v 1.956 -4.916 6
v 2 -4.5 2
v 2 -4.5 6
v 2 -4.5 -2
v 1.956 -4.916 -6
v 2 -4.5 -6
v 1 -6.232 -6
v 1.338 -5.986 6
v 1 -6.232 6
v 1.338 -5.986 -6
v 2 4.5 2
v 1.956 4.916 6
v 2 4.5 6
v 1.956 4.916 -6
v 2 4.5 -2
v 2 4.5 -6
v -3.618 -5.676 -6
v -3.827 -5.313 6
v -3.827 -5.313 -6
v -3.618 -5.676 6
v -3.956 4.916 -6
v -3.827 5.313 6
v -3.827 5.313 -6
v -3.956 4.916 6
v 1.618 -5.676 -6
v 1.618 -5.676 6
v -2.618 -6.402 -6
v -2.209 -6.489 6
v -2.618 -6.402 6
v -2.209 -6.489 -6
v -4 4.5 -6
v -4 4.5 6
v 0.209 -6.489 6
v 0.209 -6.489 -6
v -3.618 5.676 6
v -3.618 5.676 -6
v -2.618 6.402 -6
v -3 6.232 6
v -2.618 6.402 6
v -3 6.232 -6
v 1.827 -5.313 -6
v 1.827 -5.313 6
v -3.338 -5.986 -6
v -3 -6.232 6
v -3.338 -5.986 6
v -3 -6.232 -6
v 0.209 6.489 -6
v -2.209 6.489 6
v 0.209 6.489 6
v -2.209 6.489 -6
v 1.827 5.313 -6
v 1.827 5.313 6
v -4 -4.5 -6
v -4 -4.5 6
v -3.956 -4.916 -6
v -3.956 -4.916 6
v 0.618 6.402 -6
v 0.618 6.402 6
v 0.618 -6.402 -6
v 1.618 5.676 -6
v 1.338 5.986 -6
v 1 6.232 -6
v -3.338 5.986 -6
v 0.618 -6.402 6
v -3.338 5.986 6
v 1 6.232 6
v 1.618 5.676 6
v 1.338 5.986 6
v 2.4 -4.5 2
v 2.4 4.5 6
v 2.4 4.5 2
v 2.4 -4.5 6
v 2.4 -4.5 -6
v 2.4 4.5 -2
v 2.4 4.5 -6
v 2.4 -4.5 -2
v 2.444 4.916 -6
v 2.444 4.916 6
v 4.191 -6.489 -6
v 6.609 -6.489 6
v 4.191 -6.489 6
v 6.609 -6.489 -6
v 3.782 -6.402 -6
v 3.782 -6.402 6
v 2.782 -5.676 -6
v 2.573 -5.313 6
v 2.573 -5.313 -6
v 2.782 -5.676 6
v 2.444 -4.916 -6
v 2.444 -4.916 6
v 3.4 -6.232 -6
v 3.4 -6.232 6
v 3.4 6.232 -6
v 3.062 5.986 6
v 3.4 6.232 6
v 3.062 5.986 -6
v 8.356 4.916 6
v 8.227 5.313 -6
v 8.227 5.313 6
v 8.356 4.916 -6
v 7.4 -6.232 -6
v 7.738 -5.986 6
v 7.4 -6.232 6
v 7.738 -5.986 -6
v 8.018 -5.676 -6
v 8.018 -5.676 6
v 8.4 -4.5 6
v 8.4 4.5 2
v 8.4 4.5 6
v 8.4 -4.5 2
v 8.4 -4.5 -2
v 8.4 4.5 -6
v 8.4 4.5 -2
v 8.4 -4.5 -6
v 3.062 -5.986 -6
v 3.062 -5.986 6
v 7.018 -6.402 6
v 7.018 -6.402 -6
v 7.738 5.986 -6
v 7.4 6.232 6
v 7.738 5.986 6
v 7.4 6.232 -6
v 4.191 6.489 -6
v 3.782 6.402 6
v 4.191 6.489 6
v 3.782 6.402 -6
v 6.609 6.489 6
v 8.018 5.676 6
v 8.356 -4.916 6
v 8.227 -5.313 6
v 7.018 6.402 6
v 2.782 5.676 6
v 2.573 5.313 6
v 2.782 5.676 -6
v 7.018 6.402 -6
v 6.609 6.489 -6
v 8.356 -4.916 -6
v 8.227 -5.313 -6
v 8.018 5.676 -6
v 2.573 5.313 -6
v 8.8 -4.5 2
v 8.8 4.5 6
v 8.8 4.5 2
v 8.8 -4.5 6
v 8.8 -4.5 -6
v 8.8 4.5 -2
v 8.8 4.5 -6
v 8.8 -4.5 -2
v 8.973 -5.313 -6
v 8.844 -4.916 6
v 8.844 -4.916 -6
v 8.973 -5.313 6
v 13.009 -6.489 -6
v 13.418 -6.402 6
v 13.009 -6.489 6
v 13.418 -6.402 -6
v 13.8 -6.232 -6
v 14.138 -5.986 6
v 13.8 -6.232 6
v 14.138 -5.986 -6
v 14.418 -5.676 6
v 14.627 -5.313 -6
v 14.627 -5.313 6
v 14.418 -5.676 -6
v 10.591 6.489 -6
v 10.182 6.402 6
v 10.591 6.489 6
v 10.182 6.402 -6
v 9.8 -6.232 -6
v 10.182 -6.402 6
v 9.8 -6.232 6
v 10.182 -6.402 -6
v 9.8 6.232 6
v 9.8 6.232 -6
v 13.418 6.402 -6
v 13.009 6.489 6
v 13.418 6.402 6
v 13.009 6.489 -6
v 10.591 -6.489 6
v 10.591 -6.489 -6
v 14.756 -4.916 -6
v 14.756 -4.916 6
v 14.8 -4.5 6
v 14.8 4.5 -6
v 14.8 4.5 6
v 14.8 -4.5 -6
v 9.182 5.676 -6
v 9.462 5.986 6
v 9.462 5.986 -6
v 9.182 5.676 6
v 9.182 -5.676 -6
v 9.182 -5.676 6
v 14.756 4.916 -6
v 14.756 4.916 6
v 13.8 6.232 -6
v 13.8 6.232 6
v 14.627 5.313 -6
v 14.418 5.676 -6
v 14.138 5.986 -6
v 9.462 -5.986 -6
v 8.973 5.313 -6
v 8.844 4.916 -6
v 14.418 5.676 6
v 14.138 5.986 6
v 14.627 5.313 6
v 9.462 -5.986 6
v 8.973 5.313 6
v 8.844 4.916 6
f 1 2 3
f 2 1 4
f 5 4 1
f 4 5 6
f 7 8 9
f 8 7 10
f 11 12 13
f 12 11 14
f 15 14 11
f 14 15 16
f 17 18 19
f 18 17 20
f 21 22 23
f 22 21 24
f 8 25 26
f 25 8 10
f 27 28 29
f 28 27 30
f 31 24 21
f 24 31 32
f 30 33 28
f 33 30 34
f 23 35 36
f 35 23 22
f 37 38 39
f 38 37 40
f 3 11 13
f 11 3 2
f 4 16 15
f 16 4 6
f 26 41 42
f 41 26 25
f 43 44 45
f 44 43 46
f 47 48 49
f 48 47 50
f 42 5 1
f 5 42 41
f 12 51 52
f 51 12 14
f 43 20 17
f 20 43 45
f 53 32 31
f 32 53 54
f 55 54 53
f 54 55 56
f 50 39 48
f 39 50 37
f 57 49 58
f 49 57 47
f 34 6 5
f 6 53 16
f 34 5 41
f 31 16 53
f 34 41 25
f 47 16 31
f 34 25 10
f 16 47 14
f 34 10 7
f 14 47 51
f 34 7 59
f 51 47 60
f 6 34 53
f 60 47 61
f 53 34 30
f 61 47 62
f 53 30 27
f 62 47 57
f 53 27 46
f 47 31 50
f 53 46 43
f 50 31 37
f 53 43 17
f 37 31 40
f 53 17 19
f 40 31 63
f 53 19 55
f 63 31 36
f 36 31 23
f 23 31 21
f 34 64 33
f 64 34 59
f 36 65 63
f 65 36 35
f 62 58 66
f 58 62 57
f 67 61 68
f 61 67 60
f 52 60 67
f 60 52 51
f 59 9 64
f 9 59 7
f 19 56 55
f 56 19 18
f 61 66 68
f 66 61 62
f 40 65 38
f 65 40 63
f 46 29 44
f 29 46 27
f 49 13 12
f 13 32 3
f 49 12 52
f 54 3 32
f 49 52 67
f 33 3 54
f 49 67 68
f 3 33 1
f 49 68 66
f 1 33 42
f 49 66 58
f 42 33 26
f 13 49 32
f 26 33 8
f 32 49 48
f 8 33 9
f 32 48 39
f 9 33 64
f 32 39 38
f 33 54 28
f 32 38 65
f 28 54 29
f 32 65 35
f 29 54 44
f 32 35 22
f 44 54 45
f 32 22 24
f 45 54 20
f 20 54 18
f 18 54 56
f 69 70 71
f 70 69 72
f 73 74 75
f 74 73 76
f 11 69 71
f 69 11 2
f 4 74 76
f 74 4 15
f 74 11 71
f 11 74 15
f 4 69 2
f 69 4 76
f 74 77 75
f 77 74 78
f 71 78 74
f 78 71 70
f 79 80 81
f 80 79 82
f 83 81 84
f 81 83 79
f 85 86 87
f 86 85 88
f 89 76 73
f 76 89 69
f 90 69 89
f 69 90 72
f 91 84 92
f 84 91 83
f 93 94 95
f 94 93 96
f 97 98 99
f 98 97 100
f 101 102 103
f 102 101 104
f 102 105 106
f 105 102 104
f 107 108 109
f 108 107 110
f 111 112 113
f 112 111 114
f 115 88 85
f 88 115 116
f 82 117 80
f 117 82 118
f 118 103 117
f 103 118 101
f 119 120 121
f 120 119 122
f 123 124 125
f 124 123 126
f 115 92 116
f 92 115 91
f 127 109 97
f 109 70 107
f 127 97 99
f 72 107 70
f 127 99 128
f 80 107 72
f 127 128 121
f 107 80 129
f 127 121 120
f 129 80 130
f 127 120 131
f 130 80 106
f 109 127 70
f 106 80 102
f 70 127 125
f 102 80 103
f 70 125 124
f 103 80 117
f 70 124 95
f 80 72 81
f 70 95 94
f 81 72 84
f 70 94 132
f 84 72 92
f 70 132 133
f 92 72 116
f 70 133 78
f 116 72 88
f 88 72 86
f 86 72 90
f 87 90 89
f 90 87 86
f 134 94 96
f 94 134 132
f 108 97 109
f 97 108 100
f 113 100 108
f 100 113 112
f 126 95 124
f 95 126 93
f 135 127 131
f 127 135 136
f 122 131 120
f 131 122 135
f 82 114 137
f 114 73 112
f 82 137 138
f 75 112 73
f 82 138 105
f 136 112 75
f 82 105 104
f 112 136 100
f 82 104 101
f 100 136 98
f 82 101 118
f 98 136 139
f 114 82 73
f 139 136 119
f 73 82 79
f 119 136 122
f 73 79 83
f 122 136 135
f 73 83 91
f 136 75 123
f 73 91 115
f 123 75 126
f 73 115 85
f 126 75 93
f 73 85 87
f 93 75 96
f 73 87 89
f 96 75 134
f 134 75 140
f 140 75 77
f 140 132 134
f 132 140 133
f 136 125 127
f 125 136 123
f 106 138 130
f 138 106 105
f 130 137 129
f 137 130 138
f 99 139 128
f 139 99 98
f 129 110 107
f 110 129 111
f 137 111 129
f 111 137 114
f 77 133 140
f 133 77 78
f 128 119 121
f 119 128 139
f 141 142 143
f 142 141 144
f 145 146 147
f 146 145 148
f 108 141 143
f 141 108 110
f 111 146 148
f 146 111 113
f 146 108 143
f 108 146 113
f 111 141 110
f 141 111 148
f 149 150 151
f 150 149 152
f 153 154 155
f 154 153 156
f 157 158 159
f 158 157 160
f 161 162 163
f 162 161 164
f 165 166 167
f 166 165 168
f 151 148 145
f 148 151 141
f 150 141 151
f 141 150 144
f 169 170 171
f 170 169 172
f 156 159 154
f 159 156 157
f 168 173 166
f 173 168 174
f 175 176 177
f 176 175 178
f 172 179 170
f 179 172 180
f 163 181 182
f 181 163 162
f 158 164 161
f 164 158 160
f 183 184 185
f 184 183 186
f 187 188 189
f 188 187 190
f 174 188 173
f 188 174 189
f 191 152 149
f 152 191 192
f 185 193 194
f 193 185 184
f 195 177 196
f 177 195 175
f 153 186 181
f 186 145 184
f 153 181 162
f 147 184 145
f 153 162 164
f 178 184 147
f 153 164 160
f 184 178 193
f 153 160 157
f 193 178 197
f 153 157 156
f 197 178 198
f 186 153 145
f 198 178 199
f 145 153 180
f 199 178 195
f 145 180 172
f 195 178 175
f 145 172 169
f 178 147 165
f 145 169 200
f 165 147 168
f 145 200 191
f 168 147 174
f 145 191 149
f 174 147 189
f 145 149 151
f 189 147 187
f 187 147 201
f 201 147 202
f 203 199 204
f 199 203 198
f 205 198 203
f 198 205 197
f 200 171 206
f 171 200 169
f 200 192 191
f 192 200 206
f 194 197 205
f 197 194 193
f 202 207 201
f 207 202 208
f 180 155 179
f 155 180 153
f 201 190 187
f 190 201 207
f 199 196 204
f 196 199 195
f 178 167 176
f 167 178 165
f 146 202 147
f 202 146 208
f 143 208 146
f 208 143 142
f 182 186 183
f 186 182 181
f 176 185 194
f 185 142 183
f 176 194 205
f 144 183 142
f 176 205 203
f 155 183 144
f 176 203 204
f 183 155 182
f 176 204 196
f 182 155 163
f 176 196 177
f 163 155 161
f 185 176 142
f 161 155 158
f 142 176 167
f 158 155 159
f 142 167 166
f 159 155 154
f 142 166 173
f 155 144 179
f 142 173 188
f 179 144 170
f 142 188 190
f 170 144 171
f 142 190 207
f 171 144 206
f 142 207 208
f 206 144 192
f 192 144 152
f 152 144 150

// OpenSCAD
$fn=30;
height=12;
radius=2;
union(){
    hull(){
        translate([0,-4.5,0])cylinder(r=radius,h=height, center=true);
        translate([-2,4.5,0])cylinder(r=radius,h=height, center=true);
        translate([0,4.5,0])cylinder(r=radius,h=height, center=true);
        translate([-2,-4.5,0])cylinder(r=radius,h=height, center=true);
  }
  translate([2.2,0,0])cube([radius/5,radius+7,radius+2],center=true);
   translate([6.4,0,0]) hull(){
        translate([0,-4.5,0])cylinder(r=radius,h=height, center=true);
        translate([-2,4.5,0])cylinder(r=radius,h=height, center=true);
        translate([0,4.5,0])cylinder(r=radius,h=height, center=true);
        translate([-2,-4.5,0])cylinder(r=radius,h=height, center=true);
  }translate([8.6,0,0])cube([radius/5,radius+7,radius+2],center=true);
   translate([12.8,0,0]) hull(){
        translate([0,-4.5,0])cylinder(r=radius,h=height, center=true);
        translate([-2,4.5,0])cylinder(r=radius,h=height, center=true);
        translate([0,4.5,0])cylinder(r=radius,h=height, center=true);
        translate([-2,-4.5,0])cylinder(r=radius,h=height, center=true);
  }
  
}
